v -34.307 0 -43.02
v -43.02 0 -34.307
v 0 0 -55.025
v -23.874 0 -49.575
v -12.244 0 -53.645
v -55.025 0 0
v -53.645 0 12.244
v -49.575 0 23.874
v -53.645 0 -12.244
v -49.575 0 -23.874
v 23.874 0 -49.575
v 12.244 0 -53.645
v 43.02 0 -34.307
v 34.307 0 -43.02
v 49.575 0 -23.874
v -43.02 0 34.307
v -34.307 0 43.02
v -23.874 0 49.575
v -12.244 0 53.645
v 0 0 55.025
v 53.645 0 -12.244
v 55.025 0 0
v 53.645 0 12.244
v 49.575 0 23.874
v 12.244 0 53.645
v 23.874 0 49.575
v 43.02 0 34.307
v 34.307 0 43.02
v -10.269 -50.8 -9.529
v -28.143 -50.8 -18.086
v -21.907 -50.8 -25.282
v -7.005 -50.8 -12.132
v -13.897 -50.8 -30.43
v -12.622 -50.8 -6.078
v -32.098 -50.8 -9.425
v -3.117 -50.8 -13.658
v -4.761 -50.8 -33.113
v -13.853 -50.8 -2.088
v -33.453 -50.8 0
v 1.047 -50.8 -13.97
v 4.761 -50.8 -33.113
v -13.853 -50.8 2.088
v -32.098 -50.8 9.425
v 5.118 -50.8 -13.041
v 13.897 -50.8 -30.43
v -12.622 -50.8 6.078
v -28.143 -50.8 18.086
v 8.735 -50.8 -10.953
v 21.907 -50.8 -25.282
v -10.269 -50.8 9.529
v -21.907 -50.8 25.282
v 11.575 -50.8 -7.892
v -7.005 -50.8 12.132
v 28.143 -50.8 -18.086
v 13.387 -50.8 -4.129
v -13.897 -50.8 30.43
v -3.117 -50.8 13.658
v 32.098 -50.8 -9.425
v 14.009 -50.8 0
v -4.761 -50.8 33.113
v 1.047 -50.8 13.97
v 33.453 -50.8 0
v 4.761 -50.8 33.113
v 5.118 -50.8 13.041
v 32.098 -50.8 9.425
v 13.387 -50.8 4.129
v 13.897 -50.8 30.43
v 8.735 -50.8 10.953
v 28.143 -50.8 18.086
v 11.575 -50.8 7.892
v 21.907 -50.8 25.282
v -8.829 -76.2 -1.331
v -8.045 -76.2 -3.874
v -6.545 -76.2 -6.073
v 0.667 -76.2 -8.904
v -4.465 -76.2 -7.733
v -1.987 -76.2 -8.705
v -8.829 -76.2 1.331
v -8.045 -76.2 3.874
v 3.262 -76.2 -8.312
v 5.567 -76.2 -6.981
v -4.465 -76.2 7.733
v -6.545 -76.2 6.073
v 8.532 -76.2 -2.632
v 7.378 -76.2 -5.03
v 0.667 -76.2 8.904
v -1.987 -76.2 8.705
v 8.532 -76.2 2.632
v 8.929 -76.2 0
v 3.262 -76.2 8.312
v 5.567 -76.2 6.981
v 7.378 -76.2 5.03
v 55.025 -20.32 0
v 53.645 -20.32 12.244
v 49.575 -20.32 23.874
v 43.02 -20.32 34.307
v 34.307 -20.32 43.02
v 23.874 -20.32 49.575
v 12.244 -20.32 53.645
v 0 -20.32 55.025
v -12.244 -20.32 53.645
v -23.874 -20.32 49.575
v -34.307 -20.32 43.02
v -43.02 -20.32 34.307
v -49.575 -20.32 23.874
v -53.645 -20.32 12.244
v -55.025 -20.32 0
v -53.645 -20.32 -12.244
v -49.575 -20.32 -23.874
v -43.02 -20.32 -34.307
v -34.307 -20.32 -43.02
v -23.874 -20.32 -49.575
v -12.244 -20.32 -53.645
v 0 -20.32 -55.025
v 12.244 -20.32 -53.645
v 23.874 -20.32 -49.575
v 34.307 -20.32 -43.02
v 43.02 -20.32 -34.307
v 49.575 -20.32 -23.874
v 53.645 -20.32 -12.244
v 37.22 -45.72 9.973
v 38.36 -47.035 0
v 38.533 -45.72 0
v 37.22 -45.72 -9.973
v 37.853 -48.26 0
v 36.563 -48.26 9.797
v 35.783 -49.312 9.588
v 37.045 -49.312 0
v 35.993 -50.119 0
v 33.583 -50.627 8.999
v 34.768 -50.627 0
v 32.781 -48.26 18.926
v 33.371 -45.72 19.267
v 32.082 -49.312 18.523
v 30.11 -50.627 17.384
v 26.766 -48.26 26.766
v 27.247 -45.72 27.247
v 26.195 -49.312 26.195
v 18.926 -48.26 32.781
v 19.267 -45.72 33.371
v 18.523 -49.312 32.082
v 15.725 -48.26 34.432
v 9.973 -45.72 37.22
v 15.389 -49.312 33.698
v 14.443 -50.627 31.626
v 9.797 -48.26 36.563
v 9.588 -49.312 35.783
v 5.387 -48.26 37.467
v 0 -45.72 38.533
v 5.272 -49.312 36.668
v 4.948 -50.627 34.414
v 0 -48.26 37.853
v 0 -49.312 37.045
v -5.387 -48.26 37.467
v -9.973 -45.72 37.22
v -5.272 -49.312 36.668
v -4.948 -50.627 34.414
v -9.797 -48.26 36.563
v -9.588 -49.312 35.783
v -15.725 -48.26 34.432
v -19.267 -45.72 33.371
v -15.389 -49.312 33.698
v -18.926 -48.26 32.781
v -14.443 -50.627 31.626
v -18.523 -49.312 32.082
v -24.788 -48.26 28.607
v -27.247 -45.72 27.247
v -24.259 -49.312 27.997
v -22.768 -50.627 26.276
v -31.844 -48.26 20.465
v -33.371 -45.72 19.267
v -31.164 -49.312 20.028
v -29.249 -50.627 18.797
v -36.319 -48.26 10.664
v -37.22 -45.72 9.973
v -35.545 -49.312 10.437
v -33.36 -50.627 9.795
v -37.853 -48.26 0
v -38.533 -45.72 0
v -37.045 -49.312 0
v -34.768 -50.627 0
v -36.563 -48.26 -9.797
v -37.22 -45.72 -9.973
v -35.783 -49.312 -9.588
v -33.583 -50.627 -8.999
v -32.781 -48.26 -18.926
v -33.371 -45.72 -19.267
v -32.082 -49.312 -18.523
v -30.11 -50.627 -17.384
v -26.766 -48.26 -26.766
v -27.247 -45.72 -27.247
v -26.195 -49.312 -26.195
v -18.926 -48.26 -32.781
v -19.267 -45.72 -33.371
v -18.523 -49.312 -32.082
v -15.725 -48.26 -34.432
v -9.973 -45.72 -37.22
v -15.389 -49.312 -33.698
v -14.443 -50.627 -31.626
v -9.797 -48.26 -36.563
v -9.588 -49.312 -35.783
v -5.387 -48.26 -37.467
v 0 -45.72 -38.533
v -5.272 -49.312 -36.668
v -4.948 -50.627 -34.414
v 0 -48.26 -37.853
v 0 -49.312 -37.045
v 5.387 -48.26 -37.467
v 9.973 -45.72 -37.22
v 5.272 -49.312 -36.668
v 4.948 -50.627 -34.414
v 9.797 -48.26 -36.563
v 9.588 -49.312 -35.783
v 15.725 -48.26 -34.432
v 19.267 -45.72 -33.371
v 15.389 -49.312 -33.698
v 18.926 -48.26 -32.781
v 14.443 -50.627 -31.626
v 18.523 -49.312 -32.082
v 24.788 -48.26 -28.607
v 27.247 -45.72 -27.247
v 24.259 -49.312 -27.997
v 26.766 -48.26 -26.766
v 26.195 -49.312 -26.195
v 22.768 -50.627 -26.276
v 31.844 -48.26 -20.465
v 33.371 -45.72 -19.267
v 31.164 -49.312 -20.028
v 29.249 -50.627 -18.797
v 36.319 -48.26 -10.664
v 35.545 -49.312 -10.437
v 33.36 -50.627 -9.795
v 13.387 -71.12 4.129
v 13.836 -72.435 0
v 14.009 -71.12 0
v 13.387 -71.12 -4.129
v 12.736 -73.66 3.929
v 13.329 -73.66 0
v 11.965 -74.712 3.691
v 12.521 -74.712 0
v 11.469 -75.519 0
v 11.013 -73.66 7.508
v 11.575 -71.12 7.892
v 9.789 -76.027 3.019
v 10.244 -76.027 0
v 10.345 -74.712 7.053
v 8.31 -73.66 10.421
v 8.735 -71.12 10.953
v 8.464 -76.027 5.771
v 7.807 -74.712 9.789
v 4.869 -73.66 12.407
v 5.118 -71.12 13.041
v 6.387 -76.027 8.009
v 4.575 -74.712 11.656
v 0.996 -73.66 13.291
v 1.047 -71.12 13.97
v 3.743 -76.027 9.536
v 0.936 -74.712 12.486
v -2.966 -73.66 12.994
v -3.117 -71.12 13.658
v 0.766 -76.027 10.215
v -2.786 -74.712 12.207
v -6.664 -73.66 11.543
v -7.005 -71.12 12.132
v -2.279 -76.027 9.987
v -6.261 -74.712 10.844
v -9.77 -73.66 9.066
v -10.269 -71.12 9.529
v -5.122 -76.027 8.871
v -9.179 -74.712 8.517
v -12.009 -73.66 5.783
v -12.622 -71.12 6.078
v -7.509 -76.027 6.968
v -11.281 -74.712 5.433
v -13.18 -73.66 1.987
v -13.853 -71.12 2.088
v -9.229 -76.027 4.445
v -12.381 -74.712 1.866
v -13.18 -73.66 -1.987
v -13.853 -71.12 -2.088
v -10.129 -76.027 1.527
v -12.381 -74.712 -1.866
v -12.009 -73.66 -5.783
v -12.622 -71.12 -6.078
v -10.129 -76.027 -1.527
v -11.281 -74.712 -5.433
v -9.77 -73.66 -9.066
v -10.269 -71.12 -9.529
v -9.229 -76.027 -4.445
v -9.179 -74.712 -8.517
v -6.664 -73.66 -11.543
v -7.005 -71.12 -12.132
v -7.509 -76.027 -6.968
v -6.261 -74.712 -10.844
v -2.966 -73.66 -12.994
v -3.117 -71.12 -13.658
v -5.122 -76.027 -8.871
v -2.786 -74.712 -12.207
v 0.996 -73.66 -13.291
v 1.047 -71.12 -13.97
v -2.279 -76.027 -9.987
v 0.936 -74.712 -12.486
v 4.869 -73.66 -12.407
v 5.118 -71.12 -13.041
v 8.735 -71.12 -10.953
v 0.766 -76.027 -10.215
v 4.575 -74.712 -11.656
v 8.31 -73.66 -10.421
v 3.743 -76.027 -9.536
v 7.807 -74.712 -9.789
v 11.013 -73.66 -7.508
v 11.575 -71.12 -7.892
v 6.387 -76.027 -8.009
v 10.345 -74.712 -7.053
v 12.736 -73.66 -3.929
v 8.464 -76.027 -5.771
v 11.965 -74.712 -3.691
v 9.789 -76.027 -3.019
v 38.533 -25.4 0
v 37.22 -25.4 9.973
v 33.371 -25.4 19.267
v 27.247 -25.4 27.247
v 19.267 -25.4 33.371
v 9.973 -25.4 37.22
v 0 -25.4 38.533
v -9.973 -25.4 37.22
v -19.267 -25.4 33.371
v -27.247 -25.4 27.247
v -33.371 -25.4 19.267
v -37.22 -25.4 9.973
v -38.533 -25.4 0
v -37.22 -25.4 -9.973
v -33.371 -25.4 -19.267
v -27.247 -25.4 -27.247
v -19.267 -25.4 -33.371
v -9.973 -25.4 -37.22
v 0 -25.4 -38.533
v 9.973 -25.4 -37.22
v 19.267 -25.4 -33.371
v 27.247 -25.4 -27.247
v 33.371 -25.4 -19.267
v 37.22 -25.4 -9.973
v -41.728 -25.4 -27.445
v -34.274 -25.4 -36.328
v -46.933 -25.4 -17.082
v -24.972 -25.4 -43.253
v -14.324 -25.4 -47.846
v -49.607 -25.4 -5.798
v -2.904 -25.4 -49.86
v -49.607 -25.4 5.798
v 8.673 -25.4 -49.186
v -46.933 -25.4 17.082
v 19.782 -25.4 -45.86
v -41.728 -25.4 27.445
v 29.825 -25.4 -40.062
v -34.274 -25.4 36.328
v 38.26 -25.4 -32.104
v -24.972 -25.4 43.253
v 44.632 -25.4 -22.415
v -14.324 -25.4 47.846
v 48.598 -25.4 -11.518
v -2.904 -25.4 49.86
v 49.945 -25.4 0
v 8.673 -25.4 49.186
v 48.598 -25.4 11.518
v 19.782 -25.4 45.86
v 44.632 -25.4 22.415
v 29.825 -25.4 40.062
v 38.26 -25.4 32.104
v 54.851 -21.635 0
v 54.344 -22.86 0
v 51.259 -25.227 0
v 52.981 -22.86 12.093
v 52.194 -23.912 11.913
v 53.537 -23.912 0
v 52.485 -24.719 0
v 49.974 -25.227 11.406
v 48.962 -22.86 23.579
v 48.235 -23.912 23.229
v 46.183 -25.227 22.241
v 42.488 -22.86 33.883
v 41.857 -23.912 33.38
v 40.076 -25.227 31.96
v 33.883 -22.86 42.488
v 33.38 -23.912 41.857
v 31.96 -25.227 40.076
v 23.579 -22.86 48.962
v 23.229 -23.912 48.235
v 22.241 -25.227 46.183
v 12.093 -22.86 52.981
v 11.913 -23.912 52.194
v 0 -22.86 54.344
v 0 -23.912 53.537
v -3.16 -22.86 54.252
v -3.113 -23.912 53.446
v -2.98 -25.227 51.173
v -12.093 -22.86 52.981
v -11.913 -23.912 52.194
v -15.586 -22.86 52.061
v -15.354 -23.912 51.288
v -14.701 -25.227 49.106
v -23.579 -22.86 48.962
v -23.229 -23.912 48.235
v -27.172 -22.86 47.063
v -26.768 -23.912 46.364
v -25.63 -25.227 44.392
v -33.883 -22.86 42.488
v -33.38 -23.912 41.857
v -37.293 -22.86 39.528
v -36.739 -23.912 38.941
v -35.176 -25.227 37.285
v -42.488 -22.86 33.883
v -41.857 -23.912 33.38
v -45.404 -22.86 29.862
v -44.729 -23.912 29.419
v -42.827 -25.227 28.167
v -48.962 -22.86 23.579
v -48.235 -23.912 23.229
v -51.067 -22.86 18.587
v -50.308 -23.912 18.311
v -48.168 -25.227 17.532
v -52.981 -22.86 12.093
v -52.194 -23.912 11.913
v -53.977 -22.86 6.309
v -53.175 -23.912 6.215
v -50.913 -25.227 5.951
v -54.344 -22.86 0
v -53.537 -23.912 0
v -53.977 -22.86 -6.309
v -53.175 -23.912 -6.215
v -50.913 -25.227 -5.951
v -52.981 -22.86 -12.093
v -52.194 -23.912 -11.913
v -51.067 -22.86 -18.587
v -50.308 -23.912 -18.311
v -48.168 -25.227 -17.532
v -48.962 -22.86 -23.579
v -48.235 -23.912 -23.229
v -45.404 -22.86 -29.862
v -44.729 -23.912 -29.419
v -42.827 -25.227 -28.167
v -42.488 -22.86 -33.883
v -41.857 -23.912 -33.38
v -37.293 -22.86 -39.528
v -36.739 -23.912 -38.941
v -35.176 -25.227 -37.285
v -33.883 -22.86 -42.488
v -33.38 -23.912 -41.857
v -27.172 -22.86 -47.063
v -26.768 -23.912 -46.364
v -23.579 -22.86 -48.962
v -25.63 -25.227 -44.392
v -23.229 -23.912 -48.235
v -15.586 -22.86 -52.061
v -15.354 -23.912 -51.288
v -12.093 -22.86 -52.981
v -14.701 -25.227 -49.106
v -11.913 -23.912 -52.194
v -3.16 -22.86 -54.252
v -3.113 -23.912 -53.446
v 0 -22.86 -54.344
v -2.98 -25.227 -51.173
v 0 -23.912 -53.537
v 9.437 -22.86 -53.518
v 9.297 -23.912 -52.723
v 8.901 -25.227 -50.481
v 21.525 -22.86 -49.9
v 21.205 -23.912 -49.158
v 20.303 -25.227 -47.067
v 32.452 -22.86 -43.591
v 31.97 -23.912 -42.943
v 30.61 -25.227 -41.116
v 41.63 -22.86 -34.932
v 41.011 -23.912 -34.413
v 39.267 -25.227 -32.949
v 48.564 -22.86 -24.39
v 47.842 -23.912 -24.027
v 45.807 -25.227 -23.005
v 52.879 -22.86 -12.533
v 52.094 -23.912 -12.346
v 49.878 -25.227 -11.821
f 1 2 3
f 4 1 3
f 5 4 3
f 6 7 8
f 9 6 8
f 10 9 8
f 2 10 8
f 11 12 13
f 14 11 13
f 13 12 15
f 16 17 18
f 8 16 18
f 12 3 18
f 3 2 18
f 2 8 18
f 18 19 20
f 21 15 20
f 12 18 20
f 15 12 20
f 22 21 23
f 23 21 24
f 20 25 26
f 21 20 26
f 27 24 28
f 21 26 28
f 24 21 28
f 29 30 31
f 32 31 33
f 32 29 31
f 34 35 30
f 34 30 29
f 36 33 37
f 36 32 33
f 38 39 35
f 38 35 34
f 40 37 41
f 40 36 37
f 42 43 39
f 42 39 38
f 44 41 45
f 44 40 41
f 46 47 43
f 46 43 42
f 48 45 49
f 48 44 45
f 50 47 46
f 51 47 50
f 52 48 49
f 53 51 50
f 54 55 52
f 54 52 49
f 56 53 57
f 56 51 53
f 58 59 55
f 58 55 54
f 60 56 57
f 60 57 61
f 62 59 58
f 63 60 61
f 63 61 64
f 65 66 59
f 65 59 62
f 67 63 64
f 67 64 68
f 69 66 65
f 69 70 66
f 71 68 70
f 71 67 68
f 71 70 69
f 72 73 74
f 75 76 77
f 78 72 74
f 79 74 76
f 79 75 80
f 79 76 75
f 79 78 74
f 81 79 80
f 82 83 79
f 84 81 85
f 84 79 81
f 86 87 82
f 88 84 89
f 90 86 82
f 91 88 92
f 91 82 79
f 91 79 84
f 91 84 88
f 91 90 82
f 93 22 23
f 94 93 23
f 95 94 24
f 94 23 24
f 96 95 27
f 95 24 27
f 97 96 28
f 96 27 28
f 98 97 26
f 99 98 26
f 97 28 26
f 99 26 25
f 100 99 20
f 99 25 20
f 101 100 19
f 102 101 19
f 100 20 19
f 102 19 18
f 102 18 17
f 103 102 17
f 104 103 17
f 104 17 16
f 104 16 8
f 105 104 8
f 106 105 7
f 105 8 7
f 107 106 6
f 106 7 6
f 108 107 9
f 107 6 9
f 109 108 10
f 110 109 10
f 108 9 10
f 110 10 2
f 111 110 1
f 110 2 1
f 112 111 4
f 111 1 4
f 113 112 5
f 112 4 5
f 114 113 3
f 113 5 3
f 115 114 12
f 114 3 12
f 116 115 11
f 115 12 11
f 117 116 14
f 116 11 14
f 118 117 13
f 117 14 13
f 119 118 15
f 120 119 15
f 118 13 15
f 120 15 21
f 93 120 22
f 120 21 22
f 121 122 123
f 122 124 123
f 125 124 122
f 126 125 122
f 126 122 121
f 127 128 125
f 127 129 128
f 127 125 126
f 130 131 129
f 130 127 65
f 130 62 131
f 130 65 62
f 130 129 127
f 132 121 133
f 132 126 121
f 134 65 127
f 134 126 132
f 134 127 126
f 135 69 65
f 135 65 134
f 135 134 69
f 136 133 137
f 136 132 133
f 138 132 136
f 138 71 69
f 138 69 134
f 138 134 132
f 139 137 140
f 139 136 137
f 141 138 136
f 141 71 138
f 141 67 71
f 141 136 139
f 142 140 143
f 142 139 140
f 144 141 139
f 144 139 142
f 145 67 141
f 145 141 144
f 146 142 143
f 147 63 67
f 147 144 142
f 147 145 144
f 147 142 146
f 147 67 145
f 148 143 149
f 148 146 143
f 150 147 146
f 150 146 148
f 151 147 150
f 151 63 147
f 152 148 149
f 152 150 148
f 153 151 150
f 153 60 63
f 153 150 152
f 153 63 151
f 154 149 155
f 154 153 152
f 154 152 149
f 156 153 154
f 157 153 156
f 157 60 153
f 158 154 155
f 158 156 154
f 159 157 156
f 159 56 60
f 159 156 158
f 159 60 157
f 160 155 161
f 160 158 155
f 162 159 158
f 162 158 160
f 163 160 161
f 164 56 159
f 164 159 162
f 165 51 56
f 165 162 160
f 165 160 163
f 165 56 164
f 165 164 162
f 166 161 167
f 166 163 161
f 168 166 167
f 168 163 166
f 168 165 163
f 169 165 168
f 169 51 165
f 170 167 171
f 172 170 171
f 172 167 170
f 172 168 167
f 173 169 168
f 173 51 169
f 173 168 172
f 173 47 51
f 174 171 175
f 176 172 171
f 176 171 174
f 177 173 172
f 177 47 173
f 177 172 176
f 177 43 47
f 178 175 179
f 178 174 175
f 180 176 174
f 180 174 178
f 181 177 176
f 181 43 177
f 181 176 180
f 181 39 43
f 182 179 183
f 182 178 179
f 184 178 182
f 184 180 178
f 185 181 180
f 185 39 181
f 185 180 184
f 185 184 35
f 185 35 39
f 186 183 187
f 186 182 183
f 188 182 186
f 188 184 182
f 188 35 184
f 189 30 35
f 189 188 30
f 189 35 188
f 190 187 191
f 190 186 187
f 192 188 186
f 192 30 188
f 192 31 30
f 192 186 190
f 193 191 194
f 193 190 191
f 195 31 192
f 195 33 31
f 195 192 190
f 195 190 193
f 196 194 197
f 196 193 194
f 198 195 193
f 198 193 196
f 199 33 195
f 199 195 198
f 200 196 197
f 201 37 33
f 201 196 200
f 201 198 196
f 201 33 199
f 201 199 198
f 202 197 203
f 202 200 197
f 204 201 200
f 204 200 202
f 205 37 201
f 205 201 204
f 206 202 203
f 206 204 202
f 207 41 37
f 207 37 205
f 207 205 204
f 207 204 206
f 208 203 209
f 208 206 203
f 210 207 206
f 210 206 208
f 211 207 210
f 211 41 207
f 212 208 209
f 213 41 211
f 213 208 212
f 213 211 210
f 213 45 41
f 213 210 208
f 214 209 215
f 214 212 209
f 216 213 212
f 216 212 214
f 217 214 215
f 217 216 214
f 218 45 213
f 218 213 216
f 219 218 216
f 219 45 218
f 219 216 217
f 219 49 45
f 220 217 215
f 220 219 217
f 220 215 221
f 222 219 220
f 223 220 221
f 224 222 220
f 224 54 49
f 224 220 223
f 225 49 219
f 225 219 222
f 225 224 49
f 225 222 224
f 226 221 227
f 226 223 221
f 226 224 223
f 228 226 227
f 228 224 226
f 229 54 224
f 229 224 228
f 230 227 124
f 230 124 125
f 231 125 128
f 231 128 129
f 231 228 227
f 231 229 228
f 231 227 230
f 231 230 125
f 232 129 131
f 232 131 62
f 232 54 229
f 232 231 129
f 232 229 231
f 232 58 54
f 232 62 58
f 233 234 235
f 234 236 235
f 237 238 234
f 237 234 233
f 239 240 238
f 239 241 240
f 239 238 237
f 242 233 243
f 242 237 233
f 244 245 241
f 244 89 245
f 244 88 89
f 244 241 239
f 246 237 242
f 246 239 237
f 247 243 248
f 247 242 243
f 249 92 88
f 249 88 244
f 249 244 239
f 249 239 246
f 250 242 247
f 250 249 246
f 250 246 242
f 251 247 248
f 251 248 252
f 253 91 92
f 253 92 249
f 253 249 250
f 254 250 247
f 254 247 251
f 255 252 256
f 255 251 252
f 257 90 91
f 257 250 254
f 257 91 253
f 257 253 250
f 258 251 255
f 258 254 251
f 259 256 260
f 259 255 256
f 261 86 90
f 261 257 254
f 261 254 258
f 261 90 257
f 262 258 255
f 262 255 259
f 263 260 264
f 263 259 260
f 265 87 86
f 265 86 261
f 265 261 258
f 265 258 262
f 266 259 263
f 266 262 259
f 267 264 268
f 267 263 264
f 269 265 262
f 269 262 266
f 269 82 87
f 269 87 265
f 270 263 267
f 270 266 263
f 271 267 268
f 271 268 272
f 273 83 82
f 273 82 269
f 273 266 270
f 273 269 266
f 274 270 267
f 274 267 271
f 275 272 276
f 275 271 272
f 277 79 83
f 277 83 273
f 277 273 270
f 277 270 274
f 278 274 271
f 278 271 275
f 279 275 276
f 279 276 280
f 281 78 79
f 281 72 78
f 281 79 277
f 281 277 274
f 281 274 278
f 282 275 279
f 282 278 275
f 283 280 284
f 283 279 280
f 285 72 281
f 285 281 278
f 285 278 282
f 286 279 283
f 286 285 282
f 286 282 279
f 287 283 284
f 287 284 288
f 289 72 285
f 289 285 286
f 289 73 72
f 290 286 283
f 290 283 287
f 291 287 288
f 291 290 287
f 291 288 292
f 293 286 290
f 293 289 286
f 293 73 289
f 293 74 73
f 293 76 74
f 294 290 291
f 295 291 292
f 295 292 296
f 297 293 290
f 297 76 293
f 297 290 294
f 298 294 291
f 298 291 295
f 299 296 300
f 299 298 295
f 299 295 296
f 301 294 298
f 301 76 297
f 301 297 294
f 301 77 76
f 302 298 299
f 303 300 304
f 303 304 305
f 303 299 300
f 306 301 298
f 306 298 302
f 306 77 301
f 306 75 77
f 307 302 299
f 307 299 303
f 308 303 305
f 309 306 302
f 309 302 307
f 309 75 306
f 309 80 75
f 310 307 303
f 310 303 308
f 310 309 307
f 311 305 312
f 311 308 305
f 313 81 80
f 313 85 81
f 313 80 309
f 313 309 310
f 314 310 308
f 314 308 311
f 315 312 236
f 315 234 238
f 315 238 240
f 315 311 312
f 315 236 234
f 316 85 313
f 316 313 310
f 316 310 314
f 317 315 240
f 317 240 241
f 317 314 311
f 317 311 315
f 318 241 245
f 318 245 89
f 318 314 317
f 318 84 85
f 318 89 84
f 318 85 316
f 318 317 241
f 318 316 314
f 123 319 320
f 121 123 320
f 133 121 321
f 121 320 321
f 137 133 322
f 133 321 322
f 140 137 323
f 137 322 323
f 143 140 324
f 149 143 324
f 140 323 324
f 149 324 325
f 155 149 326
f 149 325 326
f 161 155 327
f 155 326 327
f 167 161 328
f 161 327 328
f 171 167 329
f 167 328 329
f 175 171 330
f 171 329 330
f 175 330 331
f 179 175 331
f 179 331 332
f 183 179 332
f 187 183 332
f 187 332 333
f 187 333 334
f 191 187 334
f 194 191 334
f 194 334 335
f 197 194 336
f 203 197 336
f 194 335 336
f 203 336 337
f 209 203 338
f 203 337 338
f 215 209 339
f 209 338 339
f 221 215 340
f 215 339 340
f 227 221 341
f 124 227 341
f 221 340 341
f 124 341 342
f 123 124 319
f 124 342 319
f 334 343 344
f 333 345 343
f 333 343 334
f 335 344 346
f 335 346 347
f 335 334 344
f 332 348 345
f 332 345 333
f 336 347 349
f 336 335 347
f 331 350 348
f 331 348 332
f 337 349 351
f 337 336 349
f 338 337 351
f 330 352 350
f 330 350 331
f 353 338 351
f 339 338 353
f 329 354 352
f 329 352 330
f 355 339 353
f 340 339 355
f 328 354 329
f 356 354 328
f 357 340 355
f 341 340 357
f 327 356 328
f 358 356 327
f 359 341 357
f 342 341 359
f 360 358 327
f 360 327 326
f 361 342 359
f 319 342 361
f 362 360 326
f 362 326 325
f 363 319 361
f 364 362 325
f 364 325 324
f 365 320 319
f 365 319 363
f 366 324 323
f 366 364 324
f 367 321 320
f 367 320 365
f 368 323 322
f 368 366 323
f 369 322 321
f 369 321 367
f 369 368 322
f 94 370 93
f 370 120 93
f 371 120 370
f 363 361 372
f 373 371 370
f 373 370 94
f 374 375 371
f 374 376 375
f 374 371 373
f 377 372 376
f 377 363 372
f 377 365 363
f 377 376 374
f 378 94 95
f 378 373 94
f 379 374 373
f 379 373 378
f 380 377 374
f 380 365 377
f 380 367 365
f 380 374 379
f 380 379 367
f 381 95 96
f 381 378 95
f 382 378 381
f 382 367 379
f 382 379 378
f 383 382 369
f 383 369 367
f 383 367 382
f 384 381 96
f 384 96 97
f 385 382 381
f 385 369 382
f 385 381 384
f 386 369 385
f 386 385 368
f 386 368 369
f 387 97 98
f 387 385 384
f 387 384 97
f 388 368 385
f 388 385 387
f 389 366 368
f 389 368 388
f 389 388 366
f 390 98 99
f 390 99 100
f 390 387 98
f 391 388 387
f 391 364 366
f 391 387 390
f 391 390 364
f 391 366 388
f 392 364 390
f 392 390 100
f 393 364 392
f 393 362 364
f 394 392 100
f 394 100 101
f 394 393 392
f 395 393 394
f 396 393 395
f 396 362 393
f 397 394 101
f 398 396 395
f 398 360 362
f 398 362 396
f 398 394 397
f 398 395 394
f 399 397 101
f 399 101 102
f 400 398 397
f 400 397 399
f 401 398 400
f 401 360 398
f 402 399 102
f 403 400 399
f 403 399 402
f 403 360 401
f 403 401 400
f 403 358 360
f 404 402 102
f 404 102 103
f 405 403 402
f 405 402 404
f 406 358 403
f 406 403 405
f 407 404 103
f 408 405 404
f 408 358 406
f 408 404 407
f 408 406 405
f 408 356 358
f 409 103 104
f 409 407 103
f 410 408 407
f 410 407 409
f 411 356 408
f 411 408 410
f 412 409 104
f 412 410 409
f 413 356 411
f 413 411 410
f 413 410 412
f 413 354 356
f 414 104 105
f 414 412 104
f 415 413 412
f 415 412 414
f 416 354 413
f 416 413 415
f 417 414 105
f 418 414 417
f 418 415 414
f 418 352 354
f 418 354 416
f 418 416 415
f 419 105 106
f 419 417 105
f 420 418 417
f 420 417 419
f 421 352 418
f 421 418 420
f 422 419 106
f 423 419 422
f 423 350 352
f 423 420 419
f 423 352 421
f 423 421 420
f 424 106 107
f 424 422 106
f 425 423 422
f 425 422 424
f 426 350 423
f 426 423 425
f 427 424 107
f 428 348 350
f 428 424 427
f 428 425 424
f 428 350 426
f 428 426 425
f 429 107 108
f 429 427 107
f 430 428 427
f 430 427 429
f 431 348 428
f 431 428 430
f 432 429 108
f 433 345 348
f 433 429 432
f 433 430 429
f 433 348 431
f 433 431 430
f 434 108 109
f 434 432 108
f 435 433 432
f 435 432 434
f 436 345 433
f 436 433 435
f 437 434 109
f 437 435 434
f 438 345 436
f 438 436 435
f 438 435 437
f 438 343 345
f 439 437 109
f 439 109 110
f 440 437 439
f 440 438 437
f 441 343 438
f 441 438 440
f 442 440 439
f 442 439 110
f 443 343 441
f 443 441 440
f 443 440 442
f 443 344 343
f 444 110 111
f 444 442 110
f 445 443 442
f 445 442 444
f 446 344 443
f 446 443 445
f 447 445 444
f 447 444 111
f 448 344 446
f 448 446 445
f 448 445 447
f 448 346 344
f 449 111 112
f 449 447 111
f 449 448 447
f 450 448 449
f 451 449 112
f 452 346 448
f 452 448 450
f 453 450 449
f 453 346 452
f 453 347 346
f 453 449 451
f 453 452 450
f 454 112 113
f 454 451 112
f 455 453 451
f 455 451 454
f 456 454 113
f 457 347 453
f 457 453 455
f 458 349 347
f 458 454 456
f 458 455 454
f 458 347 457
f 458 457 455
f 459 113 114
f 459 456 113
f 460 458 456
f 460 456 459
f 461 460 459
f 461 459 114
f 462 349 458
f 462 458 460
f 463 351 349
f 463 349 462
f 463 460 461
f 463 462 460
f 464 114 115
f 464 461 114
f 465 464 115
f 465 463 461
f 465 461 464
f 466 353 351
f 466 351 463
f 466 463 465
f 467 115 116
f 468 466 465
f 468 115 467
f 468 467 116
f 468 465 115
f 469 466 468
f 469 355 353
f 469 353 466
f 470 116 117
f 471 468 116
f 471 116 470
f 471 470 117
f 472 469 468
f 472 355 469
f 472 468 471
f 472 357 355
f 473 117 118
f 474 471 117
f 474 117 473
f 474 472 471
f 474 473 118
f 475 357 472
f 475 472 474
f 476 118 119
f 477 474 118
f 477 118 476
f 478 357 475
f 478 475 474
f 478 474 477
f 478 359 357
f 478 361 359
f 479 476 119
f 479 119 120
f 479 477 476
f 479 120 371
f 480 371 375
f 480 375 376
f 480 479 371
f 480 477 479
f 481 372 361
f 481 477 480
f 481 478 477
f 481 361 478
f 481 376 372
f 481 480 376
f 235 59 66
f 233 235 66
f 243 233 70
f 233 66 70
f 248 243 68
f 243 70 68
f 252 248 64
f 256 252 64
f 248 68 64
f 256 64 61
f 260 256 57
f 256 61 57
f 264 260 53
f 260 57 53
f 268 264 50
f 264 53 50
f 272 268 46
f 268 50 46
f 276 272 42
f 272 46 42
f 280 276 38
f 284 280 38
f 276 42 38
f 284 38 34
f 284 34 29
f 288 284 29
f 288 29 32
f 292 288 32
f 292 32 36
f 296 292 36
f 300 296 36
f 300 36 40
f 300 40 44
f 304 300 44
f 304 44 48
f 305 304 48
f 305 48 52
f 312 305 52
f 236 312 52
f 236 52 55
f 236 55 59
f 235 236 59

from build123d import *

# Parameters (mm, degrees)
F0_R      = 55.024553
F1_DEPTH  = 25.4
F2_R      = 38.533102
F2_R_2    = 14.009094
F3_DEPTH  = 25.4
F4_R      = 5.08
F3_FACE_R = 14.009094
F5_DEPTH  = 50.8
F6_R      = 5.08


with BuildPart() as f1:
    # F0 (on Front) → F1 (new body)
    with BuildSketch(Plane.XZ):
        Circle(F0_R)
    extrude(amount=F1_DEPTH)

    # F2 (on face) → F3 (join)
    with BuildSketch(Plane.XZ.offset(25.4)):
        Circle(F2_R)
        Circle(F2_R_2, mode=Mode.SUBTRACT)
    extrude(amount=F3_DEPTH)

    # F4
    f4_edges = [f1.edges().sort_by_distance(p)[0] for p in [
        (-55.024553, -25.4, 0),
        (-38.533102, -50.8, 0),
    ]]
    fillet(f4_edges, radius=F4_R)

    # F3_face (on face) → F5 (join)
    with BuildSketch(Plane.XZ.offset(25.4)):
        Circle(F3_FACE_R)
    extrude(amount=F5_DEPTH)

    # F6
    f6_edges = [f1.edges().sort_by_distance(p)[0] for p in [
        (-14.009094, -76.2, 0),
    ]]
    fillet(f6_edges, radius=F6_R)


solid = f1.part
